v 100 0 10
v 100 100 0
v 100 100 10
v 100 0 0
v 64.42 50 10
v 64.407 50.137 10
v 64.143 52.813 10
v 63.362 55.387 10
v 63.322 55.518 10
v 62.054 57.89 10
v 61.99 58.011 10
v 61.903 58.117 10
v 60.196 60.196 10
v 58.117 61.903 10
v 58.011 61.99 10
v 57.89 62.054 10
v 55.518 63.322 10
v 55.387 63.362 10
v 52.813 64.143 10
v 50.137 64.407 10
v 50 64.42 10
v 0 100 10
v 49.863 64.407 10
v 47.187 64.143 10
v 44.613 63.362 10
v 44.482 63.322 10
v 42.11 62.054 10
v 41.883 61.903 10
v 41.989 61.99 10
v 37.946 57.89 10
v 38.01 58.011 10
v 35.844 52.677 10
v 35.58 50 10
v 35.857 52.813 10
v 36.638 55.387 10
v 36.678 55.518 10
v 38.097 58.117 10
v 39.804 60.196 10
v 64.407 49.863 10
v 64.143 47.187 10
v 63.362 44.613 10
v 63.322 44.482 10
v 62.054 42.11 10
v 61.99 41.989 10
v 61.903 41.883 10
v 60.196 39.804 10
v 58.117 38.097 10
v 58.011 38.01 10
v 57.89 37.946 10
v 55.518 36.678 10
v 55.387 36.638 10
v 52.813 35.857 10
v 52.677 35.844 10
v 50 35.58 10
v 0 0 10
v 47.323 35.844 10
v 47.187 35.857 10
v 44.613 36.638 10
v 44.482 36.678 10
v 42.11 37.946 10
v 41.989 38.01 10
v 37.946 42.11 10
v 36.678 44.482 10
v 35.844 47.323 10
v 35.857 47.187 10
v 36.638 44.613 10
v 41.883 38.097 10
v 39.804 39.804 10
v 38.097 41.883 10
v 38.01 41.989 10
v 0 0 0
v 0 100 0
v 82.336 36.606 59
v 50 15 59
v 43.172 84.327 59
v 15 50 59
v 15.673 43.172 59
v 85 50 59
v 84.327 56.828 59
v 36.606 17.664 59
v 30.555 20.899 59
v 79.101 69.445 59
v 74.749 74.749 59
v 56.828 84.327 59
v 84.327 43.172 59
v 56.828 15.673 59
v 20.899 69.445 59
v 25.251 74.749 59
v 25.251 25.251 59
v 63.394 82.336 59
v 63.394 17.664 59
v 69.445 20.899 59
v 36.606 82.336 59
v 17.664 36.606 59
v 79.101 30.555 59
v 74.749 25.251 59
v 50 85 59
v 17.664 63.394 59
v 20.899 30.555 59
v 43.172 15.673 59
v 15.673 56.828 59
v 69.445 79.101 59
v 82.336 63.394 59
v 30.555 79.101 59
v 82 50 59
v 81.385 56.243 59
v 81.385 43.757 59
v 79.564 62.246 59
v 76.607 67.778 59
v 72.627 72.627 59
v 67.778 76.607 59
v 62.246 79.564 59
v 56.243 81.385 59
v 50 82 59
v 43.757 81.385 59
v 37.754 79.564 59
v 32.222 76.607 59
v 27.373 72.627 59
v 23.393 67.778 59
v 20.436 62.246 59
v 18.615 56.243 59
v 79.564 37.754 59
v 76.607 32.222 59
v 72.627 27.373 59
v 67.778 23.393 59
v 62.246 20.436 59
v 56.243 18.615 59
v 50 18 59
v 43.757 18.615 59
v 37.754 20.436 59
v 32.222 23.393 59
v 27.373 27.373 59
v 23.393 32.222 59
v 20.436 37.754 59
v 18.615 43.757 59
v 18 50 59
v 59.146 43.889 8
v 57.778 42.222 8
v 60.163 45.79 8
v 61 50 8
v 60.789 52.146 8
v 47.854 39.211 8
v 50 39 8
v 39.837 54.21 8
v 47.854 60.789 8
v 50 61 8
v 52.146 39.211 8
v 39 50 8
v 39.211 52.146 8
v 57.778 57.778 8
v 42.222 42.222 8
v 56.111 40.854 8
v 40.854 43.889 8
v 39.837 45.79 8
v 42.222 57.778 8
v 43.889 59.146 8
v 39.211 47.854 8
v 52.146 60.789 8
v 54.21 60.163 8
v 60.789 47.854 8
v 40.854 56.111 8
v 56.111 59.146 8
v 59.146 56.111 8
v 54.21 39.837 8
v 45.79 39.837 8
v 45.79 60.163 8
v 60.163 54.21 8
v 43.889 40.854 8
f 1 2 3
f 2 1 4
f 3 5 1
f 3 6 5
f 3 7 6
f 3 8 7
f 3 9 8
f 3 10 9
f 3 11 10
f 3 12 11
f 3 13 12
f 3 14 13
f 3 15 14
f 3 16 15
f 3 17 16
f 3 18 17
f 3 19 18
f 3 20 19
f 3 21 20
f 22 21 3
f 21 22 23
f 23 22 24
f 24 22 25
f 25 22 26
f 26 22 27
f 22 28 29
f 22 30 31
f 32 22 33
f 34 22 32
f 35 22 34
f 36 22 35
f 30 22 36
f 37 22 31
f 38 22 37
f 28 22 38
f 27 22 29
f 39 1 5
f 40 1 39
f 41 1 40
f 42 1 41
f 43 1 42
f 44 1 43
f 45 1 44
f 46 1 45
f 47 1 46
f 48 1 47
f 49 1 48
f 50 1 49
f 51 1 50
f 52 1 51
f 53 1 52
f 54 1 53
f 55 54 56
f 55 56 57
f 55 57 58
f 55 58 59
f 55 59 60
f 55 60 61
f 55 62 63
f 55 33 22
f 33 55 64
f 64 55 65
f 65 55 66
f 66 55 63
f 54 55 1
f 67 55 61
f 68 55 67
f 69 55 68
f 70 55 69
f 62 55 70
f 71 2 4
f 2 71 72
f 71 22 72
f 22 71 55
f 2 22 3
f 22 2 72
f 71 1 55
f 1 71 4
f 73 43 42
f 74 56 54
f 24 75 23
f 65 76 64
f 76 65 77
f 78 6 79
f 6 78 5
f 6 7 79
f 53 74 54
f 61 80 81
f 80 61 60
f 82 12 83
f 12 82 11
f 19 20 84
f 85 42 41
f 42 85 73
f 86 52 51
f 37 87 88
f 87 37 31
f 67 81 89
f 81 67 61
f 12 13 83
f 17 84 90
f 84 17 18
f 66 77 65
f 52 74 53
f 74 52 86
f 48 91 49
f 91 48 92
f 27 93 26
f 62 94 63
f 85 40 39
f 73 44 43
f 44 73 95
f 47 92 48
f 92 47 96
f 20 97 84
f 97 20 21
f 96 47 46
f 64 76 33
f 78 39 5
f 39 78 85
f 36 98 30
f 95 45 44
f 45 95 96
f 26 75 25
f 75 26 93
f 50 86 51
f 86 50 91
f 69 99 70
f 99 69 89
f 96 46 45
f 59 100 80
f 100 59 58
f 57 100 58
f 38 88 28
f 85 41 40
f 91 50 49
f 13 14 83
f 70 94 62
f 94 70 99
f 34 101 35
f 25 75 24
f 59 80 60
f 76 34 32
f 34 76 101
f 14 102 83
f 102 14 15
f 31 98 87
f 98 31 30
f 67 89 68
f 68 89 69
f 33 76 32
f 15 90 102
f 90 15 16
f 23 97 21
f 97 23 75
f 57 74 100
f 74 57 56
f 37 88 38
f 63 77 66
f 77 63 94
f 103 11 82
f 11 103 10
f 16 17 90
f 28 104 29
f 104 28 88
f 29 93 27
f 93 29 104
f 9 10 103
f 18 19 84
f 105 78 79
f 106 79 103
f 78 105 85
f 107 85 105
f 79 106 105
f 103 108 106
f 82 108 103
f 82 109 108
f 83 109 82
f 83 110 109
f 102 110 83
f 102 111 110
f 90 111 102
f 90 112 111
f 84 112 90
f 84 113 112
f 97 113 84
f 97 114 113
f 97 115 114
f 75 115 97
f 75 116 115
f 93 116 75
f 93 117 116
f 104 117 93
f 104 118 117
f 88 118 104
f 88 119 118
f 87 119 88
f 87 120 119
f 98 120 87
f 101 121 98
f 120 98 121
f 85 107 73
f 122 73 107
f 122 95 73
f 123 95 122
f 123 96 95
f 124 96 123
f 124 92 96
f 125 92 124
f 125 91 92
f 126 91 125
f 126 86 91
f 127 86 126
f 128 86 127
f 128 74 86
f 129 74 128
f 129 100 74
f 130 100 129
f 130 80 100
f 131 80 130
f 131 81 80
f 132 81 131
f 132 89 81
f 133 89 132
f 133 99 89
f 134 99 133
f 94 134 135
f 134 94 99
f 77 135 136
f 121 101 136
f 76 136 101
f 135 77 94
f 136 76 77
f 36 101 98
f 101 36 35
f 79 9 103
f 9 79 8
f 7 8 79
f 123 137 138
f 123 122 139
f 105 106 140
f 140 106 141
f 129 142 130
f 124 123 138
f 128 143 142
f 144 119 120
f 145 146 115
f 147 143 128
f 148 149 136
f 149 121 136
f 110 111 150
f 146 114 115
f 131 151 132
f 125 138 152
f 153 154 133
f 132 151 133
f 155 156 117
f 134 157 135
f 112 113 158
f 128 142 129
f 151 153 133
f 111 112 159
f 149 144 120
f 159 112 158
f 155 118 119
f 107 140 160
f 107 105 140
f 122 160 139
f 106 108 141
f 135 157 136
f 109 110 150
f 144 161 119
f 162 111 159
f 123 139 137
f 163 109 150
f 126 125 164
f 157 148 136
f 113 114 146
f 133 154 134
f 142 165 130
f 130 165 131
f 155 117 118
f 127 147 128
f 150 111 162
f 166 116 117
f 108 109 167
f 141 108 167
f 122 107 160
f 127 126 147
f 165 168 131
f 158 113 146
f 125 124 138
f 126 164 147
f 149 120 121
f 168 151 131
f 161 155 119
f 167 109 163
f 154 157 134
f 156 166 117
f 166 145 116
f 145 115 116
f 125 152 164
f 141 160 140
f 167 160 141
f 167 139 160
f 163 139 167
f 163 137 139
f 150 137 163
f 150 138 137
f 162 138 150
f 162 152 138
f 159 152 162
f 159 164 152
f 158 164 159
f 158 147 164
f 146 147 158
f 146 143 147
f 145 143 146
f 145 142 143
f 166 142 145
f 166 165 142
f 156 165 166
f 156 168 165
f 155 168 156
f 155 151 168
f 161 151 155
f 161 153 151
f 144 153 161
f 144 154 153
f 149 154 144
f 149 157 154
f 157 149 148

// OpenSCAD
$fn = 32;

// ----------------------------------------------------------------------
// Hopper: funnel with square flange
// ----------------------------------------------------------------------

// --- parameters (mm) ---
fl = 100;                 // flange side, X and Y
fl_t = 10;                // flange thickness
cone_h = 50;              // cone height above the flange
top_d = 70;               // cone mouth diameter
bot_d = 28;               // cone spout diameter
wall = 3;                 // cone wall thickness

bore_d = bot_d - 2 * wall;  // spout bore diameter
total_h = fl_t + cone_h - 1;  // overall height

difference() {
  union() {
    cube([fl, fl, fl_t]);
    translate([fl / 2, fl / 2, fl_t - 1])
      cylinder(h = cone_h, d1 = bot_d, d2 = top_d);
  }
  translate([fl / 2, fl / 2, fl_t - 2])
    cylinder(h = cone_h + 1, d1 = bore_d, d2 = top_d - 2 * wall);
}
